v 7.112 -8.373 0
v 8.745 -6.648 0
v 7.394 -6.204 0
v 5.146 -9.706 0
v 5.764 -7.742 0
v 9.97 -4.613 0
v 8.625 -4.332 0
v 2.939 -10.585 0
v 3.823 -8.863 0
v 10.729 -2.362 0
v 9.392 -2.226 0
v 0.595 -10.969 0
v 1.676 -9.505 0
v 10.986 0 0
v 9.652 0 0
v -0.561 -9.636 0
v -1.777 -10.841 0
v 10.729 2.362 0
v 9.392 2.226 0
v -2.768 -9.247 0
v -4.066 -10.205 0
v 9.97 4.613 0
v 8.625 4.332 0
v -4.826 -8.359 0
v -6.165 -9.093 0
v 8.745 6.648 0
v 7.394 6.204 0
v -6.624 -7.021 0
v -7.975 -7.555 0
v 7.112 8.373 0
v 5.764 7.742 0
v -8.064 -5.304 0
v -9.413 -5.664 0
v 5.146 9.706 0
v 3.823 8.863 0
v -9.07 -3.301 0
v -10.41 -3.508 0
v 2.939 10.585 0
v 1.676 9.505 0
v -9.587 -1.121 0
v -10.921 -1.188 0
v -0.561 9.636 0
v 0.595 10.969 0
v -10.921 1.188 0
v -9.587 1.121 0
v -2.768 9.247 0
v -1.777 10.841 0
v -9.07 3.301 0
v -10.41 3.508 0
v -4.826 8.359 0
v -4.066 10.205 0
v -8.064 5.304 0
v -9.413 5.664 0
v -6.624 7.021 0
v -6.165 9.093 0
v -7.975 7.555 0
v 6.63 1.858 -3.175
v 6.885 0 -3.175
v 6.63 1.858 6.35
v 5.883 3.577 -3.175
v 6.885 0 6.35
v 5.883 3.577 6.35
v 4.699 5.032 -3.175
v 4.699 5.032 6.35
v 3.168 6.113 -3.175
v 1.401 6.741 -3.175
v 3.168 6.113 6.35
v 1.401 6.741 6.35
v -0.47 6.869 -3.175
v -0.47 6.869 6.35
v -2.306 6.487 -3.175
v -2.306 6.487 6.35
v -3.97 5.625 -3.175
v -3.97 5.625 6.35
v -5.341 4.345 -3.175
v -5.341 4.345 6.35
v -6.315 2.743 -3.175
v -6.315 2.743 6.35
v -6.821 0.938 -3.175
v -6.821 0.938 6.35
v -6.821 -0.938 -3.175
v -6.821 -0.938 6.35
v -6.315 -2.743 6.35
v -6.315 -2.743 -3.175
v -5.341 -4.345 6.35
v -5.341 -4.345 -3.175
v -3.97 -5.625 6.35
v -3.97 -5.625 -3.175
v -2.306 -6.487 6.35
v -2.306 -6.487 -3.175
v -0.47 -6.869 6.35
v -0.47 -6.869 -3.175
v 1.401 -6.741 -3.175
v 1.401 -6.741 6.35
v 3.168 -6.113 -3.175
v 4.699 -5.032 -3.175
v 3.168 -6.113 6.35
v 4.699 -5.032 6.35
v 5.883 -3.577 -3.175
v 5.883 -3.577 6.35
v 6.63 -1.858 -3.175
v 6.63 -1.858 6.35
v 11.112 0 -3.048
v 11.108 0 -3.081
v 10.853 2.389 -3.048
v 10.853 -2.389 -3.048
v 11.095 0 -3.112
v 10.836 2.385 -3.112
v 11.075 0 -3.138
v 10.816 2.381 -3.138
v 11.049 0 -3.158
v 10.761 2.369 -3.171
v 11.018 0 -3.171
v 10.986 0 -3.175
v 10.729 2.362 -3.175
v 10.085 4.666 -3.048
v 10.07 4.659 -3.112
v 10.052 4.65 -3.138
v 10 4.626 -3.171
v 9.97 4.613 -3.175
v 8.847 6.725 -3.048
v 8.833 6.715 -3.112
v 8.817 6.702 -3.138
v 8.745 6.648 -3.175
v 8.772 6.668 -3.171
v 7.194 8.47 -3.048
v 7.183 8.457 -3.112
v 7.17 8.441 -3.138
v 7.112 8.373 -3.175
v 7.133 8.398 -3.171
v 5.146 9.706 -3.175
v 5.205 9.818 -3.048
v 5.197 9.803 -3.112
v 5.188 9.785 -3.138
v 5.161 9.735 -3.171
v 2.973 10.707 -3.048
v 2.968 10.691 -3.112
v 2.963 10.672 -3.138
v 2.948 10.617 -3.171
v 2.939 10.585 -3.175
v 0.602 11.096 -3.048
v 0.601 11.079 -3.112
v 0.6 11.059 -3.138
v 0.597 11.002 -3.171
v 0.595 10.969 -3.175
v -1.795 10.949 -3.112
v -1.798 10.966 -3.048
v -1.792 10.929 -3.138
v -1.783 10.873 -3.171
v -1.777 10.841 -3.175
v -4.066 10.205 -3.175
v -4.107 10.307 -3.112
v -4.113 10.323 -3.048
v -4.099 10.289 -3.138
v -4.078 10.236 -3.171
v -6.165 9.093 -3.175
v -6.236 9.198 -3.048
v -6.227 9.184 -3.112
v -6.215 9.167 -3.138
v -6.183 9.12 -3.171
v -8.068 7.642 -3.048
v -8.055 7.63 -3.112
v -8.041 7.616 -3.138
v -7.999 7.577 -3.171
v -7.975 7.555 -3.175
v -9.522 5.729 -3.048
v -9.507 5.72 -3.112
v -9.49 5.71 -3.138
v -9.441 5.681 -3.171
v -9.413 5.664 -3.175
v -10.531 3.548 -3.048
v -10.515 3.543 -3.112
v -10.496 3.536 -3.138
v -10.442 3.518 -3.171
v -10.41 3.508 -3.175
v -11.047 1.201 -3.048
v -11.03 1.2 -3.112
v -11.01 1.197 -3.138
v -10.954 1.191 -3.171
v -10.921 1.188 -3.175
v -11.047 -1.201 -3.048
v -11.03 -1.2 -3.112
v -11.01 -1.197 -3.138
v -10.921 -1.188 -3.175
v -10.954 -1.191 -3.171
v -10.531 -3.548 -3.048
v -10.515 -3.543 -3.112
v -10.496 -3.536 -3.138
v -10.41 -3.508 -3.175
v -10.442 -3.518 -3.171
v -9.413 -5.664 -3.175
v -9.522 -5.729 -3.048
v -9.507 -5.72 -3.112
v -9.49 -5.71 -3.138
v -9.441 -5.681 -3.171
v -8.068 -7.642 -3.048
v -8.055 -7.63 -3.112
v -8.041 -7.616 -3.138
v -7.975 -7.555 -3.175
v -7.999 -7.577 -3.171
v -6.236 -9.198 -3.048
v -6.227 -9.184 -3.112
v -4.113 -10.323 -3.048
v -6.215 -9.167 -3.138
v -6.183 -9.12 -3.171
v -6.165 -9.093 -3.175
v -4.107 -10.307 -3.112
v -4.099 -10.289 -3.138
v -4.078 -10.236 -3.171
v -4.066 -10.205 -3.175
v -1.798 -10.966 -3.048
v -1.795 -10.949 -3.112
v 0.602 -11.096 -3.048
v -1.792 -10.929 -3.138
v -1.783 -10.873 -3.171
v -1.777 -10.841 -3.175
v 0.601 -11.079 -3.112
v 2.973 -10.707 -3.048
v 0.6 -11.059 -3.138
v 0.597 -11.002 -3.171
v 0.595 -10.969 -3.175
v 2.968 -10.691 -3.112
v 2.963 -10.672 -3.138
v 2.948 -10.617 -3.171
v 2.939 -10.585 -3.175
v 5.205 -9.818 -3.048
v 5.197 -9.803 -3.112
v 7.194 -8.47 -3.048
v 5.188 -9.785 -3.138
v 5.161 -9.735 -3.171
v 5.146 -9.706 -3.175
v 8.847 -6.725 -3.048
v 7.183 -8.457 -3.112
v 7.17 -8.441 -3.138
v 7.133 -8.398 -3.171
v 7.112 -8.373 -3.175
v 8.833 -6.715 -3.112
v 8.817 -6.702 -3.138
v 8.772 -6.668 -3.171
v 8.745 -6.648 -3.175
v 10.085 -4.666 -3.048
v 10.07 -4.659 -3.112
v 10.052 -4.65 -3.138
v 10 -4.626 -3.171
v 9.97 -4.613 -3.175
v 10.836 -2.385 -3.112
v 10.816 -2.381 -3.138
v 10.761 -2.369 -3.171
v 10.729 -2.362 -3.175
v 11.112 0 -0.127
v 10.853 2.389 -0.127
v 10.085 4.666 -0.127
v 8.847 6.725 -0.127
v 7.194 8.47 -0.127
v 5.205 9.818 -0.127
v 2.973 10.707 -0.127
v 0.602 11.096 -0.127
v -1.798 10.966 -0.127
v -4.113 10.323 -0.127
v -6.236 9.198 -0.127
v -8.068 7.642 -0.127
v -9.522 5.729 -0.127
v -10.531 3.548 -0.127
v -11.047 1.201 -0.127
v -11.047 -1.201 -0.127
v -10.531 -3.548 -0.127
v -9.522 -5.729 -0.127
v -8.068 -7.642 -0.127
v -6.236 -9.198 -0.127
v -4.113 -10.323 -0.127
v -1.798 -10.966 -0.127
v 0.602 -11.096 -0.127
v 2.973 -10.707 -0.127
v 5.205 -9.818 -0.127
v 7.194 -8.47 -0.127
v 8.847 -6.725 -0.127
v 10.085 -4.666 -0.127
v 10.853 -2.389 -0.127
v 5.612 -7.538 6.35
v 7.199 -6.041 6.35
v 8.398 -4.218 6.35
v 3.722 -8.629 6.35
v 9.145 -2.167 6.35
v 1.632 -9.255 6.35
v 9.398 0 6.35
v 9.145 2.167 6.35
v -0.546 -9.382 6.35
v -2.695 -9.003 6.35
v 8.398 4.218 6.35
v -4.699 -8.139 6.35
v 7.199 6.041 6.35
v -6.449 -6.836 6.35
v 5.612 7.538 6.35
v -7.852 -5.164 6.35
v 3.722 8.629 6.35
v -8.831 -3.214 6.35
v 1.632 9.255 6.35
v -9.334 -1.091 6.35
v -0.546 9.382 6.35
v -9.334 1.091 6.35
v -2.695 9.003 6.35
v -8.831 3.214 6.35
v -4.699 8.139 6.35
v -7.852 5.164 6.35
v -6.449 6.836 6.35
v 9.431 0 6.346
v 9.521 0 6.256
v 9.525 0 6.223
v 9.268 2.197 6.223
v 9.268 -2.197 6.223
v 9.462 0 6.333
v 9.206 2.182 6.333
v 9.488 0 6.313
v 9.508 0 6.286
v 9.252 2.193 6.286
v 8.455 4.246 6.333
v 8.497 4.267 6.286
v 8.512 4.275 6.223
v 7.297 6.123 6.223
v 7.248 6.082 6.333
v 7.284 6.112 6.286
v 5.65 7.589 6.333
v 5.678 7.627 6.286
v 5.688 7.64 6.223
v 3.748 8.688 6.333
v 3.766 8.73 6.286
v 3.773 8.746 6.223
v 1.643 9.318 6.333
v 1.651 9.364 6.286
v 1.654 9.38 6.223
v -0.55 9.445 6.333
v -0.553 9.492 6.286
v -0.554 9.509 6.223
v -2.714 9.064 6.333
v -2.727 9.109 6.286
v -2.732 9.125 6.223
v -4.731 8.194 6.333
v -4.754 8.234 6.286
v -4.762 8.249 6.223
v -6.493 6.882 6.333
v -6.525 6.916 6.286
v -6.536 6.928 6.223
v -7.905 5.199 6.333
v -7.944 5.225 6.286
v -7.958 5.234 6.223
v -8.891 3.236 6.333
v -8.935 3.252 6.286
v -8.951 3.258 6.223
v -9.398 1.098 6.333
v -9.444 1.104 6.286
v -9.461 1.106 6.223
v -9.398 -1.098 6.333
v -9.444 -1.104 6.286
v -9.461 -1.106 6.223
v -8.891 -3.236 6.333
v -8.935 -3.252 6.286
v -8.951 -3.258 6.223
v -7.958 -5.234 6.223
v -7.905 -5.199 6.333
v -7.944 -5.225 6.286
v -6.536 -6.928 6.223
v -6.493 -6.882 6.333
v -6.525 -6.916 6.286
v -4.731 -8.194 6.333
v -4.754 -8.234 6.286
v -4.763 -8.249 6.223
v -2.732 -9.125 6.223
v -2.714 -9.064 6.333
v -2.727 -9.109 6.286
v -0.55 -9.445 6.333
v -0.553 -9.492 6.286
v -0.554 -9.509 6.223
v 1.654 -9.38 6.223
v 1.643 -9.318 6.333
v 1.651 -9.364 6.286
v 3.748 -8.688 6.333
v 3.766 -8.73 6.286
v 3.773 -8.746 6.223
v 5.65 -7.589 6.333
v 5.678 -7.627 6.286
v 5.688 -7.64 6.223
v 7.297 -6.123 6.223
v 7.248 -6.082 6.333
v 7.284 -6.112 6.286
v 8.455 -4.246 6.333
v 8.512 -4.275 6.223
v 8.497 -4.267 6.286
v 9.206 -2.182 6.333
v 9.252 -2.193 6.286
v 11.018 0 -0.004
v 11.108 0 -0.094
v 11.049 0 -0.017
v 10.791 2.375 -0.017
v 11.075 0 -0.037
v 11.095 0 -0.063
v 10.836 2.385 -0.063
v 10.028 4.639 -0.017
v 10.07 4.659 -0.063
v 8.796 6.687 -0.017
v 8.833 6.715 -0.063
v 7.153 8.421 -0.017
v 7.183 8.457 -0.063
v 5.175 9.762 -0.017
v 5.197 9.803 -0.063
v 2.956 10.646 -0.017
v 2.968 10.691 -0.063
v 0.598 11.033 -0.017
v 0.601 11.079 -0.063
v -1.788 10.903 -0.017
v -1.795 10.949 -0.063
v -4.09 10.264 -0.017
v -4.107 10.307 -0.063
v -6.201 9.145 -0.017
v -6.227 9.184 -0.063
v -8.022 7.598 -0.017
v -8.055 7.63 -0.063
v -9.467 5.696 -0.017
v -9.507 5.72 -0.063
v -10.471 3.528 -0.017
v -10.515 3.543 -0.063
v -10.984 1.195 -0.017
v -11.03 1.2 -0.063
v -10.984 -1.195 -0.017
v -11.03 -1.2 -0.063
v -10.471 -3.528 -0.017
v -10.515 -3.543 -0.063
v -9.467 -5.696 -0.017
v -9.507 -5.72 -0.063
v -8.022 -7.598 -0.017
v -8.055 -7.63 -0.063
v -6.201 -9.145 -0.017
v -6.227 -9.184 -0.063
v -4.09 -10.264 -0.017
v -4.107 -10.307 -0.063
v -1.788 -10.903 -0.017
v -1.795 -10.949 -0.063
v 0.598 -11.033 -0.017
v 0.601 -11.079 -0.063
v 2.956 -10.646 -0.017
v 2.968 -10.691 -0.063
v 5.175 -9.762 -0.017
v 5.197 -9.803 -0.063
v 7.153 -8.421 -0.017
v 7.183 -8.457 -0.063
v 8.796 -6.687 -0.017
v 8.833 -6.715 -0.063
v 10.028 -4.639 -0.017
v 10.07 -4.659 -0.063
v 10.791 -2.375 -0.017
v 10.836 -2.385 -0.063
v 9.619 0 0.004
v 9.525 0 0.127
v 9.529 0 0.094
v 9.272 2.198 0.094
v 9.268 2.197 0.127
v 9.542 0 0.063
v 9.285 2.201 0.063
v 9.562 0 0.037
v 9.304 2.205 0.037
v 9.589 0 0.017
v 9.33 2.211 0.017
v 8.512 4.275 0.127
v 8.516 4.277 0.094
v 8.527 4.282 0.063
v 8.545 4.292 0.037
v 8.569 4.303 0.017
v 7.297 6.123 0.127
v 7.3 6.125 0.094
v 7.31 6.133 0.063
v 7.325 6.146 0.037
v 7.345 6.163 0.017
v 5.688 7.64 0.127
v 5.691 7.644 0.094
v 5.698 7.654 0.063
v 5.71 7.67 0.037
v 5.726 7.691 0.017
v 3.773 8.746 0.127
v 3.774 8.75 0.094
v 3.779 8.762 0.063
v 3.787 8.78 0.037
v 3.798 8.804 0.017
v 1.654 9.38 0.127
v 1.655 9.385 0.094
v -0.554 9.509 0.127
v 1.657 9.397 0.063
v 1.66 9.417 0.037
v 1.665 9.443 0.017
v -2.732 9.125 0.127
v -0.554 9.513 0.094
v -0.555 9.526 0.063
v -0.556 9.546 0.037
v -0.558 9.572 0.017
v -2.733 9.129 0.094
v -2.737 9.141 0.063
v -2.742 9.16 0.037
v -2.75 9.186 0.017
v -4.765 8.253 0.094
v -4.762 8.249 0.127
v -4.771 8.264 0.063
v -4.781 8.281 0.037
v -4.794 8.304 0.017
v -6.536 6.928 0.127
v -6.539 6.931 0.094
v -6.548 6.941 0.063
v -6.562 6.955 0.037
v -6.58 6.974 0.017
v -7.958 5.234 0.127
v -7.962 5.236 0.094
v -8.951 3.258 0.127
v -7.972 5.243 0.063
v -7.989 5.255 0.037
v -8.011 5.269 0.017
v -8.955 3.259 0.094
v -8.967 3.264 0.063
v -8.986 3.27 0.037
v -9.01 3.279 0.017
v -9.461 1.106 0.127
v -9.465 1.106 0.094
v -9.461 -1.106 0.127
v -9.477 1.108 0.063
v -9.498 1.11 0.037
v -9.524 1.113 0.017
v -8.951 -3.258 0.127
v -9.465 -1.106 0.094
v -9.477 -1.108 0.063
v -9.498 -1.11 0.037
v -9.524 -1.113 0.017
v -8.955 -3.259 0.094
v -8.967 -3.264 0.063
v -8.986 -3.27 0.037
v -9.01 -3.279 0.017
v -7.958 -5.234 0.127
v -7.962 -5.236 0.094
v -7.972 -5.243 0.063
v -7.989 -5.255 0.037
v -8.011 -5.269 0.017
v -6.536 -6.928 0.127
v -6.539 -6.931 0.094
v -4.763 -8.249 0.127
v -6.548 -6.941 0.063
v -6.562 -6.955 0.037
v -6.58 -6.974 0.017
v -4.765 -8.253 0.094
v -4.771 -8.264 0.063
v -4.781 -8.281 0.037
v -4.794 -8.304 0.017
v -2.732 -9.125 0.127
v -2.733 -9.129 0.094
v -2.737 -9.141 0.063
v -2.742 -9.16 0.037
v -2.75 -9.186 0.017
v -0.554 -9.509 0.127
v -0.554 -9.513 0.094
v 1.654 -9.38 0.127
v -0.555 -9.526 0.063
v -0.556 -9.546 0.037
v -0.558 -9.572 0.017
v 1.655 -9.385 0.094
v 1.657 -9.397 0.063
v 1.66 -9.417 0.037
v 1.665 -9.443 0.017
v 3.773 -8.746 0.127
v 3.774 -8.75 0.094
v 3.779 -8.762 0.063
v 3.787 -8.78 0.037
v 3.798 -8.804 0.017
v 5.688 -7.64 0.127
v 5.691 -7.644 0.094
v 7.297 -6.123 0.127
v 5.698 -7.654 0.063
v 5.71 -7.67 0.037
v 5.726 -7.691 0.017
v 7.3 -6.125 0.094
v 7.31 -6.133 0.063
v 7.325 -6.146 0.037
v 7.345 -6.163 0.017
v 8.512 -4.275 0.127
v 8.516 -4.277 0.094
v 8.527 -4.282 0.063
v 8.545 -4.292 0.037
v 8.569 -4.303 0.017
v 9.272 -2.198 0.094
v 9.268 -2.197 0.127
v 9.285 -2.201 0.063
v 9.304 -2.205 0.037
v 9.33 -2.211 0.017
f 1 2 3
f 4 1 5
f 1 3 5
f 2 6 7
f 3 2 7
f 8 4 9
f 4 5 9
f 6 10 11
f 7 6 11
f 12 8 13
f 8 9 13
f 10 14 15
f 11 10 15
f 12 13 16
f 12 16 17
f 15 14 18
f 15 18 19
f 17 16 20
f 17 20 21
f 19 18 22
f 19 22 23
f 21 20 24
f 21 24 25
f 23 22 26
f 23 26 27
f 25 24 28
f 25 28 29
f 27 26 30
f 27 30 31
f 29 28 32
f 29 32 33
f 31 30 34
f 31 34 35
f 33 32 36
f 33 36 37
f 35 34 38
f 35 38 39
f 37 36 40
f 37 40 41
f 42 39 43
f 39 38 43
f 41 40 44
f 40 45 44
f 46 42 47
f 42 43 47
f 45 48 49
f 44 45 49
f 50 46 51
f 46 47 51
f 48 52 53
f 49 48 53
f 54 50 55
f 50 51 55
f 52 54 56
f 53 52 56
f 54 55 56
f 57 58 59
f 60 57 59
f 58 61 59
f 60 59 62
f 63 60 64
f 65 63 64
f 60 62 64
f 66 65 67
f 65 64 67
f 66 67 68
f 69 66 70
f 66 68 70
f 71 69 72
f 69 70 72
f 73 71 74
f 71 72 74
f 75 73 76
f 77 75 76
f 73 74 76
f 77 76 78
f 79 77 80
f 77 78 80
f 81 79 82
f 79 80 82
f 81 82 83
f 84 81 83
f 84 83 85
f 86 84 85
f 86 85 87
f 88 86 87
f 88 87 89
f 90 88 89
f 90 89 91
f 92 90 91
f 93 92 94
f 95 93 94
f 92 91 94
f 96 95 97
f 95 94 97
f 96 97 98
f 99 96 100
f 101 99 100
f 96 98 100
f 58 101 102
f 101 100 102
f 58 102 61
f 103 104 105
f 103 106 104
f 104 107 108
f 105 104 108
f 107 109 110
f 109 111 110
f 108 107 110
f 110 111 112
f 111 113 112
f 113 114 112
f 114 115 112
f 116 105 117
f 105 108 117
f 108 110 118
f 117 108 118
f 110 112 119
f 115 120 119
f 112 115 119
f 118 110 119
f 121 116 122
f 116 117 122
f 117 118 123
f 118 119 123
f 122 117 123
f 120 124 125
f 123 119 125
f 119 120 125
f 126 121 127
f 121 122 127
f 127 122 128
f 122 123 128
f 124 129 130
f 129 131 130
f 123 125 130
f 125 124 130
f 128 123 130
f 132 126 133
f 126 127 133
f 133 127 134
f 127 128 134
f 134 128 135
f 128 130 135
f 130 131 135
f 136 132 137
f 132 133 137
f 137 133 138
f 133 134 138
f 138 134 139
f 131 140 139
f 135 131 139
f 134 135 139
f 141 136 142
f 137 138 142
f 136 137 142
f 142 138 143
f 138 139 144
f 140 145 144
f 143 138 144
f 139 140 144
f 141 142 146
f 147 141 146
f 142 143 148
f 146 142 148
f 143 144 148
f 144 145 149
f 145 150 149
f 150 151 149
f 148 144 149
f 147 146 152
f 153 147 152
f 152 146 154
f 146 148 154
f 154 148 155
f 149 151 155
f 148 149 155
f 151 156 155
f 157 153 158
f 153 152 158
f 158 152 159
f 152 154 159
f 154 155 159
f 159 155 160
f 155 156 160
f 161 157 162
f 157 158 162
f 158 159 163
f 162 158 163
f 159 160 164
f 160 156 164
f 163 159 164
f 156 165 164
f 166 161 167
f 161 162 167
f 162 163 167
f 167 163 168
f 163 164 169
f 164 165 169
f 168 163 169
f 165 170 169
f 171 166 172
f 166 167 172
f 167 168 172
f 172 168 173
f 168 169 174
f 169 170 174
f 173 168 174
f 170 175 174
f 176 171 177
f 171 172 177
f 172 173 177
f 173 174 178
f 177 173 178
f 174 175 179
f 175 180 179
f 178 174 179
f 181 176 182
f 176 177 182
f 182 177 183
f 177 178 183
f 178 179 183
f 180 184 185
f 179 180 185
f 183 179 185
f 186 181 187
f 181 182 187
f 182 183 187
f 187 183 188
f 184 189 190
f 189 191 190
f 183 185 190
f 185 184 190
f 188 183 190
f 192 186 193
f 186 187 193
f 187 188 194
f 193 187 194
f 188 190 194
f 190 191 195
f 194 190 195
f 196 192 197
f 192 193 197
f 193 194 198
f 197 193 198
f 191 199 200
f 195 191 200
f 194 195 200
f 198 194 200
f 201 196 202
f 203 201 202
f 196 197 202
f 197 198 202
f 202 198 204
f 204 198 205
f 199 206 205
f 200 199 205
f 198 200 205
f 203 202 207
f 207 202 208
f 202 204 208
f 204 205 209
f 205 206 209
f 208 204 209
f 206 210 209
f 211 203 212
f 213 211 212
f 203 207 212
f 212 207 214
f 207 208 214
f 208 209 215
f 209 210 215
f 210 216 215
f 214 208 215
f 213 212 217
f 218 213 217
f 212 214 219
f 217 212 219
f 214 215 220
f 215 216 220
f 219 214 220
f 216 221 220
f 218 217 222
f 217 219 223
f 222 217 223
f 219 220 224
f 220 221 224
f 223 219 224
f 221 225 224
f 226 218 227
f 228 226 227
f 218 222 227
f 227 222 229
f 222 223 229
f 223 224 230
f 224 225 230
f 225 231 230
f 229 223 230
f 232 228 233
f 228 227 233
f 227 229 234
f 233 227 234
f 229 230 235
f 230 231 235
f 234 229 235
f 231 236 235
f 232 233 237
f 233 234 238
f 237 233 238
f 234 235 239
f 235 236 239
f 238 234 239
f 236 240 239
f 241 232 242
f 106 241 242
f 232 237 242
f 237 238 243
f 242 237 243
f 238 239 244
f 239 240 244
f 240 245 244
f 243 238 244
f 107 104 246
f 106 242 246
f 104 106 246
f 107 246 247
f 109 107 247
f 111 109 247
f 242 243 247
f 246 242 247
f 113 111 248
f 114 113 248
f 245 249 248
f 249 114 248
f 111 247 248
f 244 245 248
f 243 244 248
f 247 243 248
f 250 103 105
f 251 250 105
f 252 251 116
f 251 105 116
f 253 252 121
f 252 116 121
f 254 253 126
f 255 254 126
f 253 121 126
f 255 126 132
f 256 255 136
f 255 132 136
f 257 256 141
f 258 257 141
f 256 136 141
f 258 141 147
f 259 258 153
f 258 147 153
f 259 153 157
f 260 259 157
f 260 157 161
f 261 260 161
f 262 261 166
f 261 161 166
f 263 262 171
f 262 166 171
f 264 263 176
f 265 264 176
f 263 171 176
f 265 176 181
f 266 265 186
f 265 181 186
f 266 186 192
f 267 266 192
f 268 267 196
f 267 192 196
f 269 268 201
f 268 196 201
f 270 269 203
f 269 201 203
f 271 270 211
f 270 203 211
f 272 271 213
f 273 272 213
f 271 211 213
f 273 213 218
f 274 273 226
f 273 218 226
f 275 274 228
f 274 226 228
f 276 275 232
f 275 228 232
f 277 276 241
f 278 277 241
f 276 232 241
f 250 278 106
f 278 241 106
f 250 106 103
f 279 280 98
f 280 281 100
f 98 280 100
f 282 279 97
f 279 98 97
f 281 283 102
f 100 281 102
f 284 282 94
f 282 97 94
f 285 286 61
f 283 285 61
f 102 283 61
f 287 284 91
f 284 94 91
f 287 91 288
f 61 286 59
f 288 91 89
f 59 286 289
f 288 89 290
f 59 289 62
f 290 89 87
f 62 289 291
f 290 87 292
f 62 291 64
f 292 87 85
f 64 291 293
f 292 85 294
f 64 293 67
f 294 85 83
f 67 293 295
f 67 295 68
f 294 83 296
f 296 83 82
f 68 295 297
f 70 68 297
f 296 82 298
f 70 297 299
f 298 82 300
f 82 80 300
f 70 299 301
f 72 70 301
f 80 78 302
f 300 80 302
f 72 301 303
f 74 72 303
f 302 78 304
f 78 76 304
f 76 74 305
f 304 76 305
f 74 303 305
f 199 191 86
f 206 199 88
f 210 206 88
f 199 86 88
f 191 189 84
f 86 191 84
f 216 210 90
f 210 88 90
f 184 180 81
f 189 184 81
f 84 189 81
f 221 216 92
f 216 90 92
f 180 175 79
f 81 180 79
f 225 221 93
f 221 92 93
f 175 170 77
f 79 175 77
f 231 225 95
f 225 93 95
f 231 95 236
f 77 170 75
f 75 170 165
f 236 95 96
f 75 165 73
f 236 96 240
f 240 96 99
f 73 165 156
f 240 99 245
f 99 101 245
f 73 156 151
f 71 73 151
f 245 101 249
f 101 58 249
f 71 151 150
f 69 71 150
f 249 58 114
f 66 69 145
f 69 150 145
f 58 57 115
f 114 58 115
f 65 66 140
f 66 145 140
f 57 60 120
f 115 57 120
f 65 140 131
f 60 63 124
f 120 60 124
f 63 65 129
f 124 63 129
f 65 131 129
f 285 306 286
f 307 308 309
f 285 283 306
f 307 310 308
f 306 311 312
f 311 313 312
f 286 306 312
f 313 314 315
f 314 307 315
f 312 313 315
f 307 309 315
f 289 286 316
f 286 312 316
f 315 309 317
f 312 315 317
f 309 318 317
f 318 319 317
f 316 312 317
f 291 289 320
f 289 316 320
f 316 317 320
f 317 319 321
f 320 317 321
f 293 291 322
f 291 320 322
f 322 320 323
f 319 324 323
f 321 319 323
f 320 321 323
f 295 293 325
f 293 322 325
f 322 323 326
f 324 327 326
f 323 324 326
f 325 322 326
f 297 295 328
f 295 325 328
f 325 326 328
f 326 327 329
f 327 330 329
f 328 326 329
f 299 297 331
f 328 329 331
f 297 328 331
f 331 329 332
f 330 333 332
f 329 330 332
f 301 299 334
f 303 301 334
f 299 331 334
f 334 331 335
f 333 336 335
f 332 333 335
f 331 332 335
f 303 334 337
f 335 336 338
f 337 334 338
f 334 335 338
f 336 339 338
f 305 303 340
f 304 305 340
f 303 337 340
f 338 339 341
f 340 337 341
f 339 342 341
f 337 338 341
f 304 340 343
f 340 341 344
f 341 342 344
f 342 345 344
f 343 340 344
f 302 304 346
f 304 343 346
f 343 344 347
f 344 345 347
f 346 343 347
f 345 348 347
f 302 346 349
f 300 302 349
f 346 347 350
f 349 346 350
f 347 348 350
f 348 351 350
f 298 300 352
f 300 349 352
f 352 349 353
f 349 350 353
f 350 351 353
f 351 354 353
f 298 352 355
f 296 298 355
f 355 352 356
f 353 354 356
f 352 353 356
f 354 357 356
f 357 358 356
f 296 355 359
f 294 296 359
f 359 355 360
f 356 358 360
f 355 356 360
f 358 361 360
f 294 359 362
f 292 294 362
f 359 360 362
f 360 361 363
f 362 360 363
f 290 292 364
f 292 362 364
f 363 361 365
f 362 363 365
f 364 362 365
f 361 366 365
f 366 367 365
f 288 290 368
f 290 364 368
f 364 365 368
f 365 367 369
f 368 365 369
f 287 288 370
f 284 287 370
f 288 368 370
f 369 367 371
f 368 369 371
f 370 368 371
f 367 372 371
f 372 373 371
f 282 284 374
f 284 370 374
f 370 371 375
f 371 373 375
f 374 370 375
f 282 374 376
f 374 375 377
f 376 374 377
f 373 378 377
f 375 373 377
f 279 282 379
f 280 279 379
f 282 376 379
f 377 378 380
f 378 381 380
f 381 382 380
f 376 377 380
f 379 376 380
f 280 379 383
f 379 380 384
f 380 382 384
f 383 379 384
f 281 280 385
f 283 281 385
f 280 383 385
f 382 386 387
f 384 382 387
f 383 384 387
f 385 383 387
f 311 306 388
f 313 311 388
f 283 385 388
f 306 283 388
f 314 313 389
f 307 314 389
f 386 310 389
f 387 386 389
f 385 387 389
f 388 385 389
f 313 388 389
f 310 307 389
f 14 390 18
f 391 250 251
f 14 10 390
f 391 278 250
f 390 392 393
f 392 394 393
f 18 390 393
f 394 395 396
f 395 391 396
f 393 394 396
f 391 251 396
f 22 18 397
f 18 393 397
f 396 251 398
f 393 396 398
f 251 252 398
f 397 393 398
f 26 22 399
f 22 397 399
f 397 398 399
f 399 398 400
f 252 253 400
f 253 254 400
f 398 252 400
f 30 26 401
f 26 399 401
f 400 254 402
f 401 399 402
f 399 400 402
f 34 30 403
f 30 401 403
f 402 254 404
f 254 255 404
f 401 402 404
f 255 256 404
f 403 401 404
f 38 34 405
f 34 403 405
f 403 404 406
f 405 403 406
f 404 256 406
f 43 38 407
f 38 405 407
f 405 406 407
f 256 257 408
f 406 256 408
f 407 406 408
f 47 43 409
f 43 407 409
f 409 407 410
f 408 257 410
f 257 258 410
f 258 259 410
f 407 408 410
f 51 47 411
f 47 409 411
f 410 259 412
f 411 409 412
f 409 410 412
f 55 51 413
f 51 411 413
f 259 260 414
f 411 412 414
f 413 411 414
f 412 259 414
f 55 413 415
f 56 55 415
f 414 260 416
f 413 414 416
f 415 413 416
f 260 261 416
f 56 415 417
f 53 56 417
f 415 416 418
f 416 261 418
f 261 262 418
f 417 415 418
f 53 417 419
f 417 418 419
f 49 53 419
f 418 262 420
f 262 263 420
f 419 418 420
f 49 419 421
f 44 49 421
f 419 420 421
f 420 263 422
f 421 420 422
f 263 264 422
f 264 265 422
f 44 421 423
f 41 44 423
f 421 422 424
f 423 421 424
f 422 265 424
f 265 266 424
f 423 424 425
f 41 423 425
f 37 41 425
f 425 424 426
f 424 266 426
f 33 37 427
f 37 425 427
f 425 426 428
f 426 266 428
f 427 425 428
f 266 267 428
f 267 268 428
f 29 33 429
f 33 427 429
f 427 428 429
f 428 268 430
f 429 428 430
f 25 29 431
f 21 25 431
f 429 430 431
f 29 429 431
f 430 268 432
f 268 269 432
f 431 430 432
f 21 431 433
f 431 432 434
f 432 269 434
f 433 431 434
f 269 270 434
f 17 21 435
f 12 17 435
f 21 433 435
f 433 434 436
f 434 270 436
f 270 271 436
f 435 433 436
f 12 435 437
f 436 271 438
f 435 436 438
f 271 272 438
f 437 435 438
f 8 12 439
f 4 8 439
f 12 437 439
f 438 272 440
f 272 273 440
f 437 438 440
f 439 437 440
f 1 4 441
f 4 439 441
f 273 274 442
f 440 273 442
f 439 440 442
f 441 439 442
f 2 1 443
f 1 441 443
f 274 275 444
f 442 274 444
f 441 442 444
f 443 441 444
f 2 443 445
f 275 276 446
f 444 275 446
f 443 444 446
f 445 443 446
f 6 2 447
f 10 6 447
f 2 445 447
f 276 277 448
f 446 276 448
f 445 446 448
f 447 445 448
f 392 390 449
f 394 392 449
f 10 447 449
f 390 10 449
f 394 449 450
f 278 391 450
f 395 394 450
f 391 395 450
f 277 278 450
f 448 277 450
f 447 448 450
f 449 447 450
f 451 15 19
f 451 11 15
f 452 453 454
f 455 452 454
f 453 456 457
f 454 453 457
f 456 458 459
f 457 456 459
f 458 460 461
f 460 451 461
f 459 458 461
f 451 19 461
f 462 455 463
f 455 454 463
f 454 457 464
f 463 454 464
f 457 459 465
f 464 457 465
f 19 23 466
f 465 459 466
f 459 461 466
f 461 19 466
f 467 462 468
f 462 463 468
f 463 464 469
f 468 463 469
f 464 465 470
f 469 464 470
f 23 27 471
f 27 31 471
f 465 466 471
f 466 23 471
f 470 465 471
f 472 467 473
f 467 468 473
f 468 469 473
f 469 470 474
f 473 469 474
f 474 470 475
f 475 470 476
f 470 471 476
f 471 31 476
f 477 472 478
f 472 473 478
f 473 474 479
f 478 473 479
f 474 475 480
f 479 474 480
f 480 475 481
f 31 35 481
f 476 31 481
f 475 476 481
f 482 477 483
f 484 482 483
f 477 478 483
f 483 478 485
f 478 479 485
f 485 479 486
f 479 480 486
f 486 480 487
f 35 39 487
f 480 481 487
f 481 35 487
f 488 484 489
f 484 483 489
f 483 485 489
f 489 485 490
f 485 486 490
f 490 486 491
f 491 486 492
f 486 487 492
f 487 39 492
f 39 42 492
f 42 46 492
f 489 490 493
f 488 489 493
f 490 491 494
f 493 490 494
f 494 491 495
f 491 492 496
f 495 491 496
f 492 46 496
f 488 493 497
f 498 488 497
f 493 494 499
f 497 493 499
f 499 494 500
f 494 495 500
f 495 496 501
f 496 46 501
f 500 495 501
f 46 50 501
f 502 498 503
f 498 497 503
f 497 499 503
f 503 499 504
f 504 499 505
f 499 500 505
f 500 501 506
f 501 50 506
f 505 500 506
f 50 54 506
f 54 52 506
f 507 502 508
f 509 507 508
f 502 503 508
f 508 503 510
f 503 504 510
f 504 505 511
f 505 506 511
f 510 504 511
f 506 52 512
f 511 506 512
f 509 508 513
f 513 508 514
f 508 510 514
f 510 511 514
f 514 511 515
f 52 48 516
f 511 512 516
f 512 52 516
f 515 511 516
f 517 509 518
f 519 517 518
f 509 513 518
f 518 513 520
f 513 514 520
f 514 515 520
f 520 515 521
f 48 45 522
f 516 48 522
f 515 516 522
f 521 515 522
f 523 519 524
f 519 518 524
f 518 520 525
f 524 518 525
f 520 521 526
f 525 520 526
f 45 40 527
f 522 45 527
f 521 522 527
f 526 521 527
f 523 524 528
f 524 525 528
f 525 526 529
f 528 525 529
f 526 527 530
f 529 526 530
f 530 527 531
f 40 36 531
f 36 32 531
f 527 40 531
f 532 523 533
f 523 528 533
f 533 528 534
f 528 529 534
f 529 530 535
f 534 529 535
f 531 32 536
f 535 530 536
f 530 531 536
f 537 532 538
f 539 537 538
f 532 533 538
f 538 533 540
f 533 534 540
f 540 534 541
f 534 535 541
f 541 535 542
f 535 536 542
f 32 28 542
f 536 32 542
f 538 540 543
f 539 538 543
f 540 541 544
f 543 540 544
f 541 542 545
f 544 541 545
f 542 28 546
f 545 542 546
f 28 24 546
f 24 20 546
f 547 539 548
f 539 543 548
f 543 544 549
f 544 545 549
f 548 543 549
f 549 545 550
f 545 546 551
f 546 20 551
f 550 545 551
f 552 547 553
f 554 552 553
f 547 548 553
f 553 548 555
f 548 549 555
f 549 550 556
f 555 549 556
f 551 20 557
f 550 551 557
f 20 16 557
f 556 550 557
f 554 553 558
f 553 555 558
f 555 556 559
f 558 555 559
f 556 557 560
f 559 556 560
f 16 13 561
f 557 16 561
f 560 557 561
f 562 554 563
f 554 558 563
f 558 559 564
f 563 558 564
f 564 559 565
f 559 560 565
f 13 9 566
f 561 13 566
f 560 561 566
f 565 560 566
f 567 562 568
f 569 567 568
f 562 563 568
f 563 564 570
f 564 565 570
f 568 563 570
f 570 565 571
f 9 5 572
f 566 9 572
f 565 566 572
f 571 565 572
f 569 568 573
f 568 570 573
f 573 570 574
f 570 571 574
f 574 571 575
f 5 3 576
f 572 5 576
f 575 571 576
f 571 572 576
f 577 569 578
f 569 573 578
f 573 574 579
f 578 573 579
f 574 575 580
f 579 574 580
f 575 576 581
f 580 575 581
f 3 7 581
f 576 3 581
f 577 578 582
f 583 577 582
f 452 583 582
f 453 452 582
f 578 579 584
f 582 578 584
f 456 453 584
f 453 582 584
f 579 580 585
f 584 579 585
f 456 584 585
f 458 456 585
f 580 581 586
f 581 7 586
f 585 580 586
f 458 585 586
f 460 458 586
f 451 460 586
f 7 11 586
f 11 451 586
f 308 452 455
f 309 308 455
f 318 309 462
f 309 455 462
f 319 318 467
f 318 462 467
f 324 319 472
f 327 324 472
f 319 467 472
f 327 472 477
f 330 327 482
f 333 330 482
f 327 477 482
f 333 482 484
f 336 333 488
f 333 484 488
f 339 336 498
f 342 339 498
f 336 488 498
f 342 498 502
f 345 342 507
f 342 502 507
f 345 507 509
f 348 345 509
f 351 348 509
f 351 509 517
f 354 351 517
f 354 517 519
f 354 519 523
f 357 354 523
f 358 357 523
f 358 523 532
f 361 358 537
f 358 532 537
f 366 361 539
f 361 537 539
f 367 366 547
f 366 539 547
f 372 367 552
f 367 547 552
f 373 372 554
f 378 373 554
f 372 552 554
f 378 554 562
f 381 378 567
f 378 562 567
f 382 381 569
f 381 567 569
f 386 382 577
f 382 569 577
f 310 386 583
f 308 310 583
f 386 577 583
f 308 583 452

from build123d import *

# Parameters (mm, degrees)
MINOR_FILLET_SMOOTHING_R = 0.127


with BuildPart() as part:
    # Sketch1 → Revolve1 (revolve)
    with BuildSketch(Plane(origin=(0, 0, 0), x_dir=(1, 0, 0), z_dir=(0, 1, 0))):
        Polygon((6.885, -6.35), (9.525, -6.35), (9.525, 0), (11.1125, 0), (11.1125, 3.175), (6.885, 3.175), align=None)
    revolve(axis=Axis((0, 0, -3.175), (0, 0, 1)))

    # Minor Fillet Smoothing
    minor_fillet_smoothing_edges = [part.edges().sort_by_distance(p)[0] for p in [
        (-11.1125, 0, -3.175),
        (-11.1125, 0, 0),
        (-9.525, 0, 0),
        (-9.525, 0, 6.35),
    ]]
    fillet(minor_fillet_smoothing_edges, radius=MINOR_FILLET_SMOOTHING_R)


solid = part.part
